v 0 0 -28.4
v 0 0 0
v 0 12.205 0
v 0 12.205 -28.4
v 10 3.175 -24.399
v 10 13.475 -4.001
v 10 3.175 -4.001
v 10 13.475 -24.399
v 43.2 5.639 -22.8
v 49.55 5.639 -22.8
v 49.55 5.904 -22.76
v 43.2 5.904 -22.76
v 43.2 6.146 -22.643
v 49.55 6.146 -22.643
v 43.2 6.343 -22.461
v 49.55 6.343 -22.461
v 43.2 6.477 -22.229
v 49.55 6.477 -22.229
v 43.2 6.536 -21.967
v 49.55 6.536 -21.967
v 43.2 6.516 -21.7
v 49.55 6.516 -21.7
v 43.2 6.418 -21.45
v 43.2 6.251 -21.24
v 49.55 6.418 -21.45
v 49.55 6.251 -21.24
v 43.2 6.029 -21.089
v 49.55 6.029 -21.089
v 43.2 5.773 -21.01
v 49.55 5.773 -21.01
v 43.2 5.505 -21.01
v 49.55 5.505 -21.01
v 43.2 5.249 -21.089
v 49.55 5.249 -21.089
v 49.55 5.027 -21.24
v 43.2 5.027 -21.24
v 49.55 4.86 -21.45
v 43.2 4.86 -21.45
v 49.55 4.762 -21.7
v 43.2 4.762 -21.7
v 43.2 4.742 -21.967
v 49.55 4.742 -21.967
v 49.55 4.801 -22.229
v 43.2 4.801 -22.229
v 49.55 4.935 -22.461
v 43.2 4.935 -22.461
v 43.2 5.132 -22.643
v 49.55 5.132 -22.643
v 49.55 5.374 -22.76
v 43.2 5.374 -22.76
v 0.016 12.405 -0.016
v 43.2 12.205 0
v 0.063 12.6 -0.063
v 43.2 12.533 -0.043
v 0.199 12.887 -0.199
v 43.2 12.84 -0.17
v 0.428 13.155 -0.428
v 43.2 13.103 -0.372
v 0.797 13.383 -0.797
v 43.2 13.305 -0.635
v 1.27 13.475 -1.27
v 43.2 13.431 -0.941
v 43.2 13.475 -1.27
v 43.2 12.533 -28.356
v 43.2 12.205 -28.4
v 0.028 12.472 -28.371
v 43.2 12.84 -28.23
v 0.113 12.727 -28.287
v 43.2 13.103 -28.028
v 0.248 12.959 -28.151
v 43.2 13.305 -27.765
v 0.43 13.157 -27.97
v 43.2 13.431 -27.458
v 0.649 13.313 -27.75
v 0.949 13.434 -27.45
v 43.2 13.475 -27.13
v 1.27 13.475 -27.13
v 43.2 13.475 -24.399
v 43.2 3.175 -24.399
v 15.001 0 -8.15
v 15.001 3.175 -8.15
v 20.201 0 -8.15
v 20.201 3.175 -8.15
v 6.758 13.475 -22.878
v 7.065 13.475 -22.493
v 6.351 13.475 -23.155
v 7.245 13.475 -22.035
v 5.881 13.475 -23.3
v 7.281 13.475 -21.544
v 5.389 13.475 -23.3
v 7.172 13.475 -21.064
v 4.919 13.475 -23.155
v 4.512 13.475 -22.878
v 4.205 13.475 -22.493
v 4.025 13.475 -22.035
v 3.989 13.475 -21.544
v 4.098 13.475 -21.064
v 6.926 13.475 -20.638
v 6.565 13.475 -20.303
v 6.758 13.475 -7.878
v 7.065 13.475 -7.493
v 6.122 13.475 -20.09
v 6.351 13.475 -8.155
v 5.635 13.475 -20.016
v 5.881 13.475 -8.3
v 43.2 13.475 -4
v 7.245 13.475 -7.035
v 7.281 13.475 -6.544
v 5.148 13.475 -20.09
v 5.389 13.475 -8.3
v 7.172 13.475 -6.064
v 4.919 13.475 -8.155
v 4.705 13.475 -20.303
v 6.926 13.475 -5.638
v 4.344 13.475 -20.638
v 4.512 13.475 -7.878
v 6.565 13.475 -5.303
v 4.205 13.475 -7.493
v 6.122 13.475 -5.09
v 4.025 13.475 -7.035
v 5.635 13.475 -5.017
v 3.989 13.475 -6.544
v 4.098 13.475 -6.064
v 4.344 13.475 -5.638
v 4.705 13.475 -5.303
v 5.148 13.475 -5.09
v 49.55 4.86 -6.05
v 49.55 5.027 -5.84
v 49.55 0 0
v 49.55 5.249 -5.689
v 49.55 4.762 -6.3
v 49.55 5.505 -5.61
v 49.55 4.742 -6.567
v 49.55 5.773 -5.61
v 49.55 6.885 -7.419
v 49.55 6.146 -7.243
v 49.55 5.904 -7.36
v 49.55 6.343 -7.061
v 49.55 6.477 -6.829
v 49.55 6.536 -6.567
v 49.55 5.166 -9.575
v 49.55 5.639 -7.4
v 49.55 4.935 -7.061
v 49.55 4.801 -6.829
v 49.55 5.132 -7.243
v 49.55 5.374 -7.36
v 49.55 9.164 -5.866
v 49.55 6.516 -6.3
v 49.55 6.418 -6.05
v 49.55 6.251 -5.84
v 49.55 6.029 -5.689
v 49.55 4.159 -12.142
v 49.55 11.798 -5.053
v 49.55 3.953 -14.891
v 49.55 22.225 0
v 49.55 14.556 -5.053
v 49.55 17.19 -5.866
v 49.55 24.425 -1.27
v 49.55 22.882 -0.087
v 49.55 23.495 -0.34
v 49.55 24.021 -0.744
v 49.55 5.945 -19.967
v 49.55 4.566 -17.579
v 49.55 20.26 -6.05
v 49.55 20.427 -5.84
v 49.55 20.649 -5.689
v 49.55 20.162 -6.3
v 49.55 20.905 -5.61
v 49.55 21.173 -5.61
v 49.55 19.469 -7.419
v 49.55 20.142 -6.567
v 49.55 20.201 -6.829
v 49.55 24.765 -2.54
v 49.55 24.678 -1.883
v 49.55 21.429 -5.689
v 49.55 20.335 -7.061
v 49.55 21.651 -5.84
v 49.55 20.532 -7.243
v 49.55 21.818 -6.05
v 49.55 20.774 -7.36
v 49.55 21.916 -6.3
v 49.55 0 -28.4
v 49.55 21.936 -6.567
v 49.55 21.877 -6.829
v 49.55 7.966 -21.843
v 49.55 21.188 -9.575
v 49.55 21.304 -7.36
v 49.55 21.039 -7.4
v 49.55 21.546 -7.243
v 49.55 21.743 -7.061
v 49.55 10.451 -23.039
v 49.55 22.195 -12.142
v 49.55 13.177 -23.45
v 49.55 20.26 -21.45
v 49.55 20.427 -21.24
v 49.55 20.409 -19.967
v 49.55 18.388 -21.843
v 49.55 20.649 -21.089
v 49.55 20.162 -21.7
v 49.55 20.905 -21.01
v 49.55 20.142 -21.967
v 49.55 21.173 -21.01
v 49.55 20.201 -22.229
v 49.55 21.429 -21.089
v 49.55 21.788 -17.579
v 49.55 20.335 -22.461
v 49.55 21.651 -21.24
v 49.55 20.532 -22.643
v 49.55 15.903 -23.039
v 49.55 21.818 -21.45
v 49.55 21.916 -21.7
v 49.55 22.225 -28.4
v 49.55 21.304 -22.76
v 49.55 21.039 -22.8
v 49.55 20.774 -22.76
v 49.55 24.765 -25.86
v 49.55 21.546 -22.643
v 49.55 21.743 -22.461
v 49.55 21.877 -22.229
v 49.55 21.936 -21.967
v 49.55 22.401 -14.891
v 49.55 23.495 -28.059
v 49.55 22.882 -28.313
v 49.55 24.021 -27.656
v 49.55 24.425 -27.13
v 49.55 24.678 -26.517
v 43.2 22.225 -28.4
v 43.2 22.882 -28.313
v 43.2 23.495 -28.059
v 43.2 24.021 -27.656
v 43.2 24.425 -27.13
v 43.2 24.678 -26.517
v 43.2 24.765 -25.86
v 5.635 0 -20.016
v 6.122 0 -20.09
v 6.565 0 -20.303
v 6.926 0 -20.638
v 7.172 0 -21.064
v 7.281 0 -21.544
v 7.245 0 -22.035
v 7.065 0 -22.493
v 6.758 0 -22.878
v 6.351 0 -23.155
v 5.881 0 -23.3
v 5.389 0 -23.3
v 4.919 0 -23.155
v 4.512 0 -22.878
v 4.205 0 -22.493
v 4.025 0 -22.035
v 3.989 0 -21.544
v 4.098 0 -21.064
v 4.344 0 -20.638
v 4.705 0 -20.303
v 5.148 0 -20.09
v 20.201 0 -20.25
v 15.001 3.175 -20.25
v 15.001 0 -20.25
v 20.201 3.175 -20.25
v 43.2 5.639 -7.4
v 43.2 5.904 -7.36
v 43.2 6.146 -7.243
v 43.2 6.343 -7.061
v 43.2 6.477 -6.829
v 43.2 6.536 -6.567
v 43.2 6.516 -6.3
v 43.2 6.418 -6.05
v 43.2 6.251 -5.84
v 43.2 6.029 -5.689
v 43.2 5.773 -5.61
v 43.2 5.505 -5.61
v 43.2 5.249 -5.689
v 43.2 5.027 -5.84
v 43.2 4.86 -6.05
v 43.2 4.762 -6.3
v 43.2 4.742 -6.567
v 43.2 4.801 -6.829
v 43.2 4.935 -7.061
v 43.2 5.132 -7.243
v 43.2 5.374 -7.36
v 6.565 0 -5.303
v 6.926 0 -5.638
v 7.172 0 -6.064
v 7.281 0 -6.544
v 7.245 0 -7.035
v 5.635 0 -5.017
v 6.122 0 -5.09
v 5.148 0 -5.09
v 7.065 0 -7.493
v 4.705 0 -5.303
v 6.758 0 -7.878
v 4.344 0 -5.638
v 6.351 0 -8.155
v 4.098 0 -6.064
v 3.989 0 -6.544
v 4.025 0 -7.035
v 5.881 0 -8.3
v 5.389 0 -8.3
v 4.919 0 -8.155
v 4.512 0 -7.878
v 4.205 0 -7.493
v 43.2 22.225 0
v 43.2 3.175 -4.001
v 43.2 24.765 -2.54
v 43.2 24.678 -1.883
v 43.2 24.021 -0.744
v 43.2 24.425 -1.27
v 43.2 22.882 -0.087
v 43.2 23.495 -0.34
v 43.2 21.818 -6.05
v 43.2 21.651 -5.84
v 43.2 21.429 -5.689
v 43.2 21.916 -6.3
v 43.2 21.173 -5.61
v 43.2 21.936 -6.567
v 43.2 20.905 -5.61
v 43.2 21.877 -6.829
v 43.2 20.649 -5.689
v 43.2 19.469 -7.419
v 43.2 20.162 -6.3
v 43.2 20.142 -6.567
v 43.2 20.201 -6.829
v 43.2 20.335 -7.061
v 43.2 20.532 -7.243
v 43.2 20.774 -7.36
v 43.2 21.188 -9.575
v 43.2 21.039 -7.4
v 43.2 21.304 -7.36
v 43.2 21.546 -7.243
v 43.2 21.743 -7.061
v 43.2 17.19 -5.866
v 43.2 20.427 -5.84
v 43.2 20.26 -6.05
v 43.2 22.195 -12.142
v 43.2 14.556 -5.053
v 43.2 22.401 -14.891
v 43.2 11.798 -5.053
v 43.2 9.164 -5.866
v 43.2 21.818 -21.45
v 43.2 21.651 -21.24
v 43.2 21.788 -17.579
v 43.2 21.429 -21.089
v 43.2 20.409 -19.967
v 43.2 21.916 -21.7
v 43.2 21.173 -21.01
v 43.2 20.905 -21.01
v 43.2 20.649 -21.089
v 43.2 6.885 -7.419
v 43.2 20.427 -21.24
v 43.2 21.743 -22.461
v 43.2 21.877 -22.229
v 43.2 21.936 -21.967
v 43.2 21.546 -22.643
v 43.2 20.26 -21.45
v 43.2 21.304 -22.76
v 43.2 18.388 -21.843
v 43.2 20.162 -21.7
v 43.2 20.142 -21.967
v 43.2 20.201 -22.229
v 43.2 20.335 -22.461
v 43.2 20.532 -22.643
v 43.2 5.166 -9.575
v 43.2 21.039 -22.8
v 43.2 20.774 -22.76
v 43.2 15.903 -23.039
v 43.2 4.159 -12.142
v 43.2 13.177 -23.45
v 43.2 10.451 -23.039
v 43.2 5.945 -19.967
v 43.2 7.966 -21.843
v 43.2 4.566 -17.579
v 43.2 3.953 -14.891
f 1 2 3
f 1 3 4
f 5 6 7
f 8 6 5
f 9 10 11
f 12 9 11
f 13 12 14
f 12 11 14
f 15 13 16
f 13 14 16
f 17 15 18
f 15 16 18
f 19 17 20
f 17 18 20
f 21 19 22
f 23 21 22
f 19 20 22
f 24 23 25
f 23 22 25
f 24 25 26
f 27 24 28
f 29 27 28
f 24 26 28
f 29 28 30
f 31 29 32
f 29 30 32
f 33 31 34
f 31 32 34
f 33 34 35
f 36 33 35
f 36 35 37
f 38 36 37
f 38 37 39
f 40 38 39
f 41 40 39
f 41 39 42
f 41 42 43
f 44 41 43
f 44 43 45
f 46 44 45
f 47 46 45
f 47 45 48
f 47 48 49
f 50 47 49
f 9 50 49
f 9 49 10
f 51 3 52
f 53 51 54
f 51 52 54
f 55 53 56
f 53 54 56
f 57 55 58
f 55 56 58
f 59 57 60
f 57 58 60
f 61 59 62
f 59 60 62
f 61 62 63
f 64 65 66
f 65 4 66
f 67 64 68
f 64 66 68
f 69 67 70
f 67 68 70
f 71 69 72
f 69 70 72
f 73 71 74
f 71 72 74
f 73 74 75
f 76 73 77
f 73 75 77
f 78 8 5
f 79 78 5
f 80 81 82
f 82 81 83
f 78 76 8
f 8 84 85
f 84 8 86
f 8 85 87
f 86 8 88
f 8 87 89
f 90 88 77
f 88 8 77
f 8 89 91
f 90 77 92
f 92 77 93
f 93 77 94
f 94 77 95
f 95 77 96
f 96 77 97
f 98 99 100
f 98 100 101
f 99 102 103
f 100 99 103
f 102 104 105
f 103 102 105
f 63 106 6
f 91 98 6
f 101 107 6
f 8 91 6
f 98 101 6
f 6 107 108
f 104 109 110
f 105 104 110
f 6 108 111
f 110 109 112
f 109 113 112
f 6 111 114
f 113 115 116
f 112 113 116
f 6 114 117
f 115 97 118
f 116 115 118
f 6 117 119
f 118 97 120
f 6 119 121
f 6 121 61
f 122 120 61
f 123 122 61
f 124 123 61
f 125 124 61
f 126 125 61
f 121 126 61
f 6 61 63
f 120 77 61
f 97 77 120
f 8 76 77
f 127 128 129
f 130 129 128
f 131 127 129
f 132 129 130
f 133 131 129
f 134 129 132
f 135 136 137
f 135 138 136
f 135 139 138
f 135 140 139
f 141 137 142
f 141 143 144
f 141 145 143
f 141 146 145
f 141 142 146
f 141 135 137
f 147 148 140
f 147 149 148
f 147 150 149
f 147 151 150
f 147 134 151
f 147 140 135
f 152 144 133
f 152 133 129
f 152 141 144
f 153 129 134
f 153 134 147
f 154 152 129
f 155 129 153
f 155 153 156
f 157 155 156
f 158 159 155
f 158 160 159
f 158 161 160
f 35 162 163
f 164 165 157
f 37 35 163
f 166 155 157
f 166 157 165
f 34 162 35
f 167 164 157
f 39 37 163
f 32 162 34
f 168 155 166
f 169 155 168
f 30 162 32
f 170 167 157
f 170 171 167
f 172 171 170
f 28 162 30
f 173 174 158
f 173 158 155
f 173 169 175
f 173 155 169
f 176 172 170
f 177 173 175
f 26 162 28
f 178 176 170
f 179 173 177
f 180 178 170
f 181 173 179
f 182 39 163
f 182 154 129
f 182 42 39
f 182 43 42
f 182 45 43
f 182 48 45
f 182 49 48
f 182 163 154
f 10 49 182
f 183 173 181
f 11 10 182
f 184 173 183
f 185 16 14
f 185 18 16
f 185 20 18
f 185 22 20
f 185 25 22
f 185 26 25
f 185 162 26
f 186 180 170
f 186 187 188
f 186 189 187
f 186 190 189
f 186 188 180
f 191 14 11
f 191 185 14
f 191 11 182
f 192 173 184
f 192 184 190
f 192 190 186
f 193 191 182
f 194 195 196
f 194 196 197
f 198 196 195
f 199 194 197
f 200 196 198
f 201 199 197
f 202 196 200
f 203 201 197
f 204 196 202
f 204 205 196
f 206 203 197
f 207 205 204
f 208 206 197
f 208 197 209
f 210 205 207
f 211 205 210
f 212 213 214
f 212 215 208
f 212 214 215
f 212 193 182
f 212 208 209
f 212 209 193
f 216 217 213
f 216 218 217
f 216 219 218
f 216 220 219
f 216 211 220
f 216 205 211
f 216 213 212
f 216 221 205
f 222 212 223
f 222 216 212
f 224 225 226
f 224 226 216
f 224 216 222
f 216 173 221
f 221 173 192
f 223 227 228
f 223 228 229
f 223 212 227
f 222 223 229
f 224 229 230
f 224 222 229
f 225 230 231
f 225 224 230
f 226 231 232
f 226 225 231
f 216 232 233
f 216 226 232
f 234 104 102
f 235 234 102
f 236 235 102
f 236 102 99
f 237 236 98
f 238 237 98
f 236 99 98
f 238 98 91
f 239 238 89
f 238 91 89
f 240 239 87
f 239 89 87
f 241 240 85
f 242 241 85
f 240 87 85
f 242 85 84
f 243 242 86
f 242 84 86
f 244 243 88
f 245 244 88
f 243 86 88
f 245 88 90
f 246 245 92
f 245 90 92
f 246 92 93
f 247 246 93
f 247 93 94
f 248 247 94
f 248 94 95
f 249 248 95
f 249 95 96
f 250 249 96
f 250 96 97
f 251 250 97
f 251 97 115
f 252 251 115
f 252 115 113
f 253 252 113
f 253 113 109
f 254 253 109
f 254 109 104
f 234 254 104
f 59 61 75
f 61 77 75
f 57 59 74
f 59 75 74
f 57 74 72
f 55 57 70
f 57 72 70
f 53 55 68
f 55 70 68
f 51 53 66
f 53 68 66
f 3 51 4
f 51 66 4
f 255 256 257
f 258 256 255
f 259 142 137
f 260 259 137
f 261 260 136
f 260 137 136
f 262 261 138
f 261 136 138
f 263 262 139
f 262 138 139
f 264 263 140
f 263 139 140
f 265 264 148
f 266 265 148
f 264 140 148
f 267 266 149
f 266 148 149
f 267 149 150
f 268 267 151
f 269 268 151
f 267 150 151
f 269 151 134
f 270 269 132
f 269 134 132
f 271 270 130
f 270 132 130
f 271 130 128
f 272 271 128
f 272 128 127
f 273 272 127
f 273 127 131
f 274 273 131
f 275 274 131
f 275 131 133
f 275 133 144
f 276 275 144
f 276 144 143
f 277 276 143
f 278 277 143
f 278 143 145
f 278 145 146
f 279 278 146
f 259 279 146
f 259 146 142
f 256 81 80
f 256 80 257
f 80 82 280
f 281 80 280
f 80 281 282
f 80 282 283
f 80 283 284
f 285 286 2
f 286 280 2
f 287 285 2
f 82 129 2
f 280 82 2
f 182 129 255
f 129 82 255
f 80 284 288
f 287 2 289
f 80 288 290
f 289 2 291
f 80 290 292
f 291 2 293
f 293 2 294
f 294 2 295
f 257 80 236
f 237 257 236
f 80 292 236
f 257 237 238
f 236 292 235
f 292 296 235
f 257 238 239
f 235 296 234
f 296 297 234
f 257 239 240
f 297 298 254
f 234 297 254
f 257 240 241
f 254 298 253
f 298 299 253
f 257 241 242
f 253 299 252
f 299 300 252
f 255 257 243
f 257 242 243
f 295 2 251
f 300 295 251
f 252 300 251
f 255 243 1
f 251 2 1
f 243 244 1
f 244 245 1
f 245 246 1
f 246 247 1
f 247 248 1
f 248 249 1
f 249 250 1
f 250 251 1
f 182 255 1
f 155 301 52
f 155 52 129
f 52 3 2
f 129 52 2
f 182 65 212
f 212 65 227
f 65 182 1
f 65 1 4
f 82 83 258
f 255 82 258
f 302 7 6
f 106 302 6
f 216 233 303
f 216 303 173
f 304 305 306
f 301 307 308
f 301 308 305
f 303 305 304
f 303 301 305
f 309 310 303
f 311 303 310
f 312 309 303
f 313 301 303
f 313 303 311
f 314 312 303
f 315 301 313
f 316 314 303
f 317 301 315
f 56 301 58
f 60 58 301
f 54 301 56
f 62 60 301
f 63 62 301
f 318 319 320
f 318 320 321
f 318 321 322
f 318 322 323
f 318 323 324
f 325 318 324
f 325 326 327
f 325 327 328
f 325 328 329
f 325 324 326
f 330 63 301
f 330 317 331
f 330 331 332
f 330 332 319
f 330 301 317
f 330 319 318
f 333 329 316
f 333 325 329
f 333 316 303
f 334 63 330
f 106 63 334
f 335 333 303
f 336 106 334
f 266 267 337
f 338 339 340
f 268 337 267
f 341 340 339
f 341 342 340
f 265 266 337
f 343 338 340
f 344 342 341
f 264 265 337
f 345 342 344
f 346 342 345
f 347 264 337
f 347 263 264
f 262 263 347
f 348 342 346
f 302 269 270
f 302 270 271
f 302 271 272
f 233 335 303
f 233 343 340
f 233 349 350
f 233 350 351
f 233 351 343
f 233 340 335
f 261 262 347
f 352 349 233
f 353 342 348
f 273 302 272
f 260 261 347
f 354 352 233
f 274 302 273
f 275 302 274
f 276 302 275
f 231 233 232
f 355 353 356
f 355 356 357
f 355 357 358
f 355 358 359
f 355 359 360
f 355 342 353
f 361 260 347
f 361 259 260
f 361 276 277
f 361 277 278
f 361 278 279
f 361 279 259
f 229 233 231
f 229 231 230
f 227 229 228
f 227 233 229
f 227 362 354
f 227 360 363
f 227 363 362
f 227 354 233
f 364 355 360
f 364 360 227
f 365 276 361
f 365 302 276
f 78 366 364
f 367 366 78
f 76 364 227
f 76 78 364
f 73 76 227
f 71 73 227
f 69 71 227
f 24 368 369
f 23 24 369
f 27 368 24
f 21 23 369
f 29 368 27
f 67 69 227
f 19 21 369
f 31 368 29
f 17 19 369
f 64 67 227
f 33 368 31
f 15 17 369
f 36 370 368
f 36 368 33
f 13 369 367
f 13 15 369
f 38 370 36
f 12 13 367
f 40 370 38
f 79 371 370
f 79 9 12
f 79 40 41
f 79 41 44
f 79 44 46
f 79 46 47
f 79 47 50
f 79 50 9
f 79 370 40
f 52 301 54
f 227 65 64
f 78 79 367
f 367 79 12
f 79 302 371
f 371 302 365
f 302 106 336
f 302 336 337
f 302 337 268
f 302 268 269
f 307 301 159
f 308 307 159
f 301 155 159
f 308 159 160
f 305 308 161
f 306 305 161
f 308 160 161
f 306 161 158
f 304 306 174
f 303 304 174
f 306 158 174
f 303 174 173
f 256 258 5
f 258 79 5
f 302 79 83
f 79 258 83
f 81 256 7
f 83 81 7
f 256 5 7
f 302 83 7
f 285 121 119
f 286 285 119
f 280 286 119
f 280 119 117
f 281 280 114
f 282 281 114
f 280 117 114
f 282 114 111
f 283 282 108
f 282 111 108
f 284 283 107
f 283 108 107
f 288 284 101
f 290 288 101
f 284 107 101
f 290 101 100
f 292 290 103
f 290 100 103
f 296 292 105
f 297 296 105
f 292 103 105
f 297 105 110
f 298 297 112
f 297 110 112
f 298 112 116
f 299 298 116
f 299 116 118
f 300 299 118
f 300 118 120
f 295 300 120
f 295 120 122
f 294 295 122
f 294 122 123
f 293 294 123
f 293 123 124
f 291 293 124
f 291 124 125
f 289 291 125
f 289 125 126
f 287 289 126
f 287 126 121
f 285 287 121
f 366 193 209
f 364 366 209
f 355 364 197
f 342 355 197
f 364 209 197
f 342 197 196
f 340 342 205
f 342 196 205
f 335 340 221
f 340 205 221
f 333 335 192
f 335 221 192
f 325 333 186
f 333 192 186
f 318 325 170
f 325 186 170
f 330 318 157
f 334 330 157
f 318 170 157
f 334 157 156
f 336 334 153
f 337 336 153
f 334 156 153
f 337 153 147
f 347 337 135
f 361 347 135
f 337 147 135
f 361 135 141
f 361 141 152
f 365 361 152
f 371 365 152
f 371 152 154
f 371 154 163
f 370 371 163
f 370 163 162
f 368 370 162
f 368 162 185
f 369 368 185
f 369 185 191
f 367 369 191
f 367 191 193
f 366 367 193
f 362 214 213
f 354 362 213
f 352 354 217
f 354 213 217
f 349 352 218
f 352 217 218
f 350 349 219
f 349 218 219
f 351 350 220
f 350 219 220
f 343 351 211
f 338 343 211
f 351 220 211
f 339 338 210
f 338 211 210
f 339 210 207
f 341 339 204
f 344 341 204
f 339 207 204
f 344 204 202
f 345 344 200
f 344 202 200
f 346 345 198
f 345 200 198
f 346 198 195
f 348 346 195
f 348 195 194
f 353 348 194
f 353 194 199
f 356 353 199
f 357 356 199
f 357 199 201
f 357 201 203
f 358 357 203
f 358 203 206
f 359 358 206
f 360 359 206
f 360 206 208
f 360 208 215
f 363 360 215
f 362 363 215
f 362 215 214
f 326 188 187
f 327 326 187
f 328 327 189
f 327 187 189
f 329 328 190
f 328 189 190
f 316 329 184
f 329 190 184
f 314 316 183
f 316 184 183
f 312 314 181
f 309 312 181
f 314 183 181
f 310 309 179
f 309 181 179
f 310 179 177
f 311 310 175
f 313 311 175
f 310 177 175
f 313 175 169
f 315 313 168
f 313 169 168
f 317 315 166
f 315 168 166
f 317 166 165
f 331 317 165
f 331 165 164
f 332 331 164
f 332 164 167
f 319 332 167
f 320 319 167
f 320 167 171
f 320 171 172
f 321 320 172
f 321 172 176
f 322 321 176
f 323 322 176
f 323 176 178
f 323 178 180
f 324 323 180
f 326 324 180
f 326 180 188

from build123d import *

# Parameters (mm, degrees)
SKETCH1_W           = 43.20032
SKETCH1_H           = 28.39974
BOSS_EXTRUDE1_DEPTH = 13.4747
SKETCH2_W           = 33.20034
SKETCH2_H           = 20.39874
CUT_EXTRUDE1_DEPTH  = 10.2997
SKETCH3_W           = 5.19938
SKETCH3_H           = 12.10056
CUT_EXTRUDE2_DEPTH  = 53.715241631
BOSS_EXTRUDE2_DEPTH = 6.35
SKETCH5_W           = 6.35
SKETCH5_H           = 28.39974
BOSS_EXTRUDE3_DEPTH = 21.59
SKETCH6_R           = 9.25
CUT_EXTRUDE3_DEPTH  = 25.4
SKETCH7_R           = 0.9
CUT_EXTRUDE4_DEPTH  = 25.4
FILLET1_R           = 2.54
FILLET2_R           = 1.27
SKETCH8_R           = 1.651
CUT_EXTRUDE5_DEPTH  = 25.4


with BuildPart() as part:
    # Sketch1 → Boss-Extrude1 (new body)
    with BuildSketch(Plane(origin=(0, 0, 0), x_dir=(1, 0, 0), z_dir=(0, 1, 0))):
        with Locations((21.60016, 14.19987)):
            Rectangle(SKETCH1_W, SKETCH1_H)
    extrude(amount=BOSS_EXTRUDE1_DEPTH)

    # Sketch2 → Cut-Extrude1 (cut)
    with BuildSketch(Plane(origin=(0, 13.4747, 0), x_dir=(1, 0, 0), z_dir=(0, 1, 0))):
        with Locations((26.60015, 14.19987)):
            Rectangle(SKETCH2_W, SKETCH2_H)
    extrude(amount=-CUT_EXTRUDE1_DEPTH, mode=Mode.SUBTRACT)

    # Sketch3 → Cut-Extrude2 (cut, through all)
    with BuildSketch(Plane(origin=(0, 3.175, 0), x_dir=(1, 0, 0), z_dir=(0, 1, 0))):
        with Locations((17.60093, 14.19987)):
            Rectangle(SKETCH3_W, SKETCH3_H)
    extrude(amount=-CUT_EXTRUDE2_DEPTH, mode=Mode.SUBTRACT)

    # Sketch4 → Boss-Extrude2 (add)
    with BuildSketch(Plane(origin=(43.20032, 0, 0), x_dir=(0, 0, -1), z_dir=(1, 0, 0))):
        Polygon((24.39924, 3.175), (4.0005, 3.175), (4.0005, 13.4747), (0, 13.4747), (0, 0), (28.39974, 0), (28.39974, 13.4747), (24.39924, 13.4747), align=None)
    extrude(amount=BOSS_EXTRUDE2_DEPTH)

    # Sketch5 → Boss-Extrude3 (add)
    with BuildSketch(Plane(origin=(0, 3.175, 0), x_dir=(1, 0, 0), z_dir=(0, 1, 0))):
        with Locations((46.37532, 14.19987)):
            Rectangle(SKETCH5_W, SKETCH5_H)
    extrude(amount=BOSS_EXTRUDE3_DEPTH)

    # Sketch6 → Cut-Extrude3 (cut)
    with BuildSketch(Plane(origin=(49.55032, 0, 0), x_dir=(0, 0, -1), z_dir=(1, 0, 0))):
        with Locations((14.19987, 13.177)):
            Circle(SKETCH6_R)
    extrude(amount=-CUT_EXTRUDE3_DEPTH, mode=Mode.SUBTRACT)

    # Sketch7 → Cut-Extrude4 (cut)
    with BuildSketch(Plane(origin=(49.55032, 0, 0), x_dir=(0, 0, -1), z_dir=(1, 0, 0))):
        with Locations((6.49987, 21.039)):
            Circle(SKETCH7_R)
        with Locations((21.89987, 21.039)):
            Circle(SKETCH7_R)
        with Locations((21.89987, 5.639)):
            Circle(SKETCH7_R)
        with Locations((6.49987, 5.639)):
            Circle(SKETCH7_R)
    extrude(amount=-CUT_EXTRUDE4_DEPTH, mode=Mode.SUBTRACT)

    # Fillet1
    fillet1_edges = [part.edges().sort_by_distance(p)[0] for p in [
        (46.37532, 24.765, -28.39974),
        (46.37532, 24.765, 0),
    ]]
    fillet(fillet1_edges, radius=FILLET1_R)

    # Fillet2
    fillet2_edges = [part.edges().sort_by_distance(p)[0] for p in [
        (21.60016, 13.4747, -28.39974),
        (0, 13.4747, -14.19987),
        (21.60016, 13.4747, 0),
    ]]
    fillet(fillet2_edges, radius=FILLET2_R)

    # Sketch8 → Cut-Extrude5 (cut)
    with BuildSketch(Plane(origin=(0, 13.4747, 0), x_dir=(1, 0, 0), z_dir=(0, 1, 0))):
        with Locations(Location((5.63499, 21.6675, 0), (0, 0, 270))):
            Circle(SKETCH8_R)
        with Locations(Location((5.63499, 6.6675, 0), (0, 0, 270))):
            Circle(SKETCH8_R)
    extrude(amount=-CUT_EXTRUDE5_DEPTH, mode=Mode.SUBTRACT)


solid = part.part
